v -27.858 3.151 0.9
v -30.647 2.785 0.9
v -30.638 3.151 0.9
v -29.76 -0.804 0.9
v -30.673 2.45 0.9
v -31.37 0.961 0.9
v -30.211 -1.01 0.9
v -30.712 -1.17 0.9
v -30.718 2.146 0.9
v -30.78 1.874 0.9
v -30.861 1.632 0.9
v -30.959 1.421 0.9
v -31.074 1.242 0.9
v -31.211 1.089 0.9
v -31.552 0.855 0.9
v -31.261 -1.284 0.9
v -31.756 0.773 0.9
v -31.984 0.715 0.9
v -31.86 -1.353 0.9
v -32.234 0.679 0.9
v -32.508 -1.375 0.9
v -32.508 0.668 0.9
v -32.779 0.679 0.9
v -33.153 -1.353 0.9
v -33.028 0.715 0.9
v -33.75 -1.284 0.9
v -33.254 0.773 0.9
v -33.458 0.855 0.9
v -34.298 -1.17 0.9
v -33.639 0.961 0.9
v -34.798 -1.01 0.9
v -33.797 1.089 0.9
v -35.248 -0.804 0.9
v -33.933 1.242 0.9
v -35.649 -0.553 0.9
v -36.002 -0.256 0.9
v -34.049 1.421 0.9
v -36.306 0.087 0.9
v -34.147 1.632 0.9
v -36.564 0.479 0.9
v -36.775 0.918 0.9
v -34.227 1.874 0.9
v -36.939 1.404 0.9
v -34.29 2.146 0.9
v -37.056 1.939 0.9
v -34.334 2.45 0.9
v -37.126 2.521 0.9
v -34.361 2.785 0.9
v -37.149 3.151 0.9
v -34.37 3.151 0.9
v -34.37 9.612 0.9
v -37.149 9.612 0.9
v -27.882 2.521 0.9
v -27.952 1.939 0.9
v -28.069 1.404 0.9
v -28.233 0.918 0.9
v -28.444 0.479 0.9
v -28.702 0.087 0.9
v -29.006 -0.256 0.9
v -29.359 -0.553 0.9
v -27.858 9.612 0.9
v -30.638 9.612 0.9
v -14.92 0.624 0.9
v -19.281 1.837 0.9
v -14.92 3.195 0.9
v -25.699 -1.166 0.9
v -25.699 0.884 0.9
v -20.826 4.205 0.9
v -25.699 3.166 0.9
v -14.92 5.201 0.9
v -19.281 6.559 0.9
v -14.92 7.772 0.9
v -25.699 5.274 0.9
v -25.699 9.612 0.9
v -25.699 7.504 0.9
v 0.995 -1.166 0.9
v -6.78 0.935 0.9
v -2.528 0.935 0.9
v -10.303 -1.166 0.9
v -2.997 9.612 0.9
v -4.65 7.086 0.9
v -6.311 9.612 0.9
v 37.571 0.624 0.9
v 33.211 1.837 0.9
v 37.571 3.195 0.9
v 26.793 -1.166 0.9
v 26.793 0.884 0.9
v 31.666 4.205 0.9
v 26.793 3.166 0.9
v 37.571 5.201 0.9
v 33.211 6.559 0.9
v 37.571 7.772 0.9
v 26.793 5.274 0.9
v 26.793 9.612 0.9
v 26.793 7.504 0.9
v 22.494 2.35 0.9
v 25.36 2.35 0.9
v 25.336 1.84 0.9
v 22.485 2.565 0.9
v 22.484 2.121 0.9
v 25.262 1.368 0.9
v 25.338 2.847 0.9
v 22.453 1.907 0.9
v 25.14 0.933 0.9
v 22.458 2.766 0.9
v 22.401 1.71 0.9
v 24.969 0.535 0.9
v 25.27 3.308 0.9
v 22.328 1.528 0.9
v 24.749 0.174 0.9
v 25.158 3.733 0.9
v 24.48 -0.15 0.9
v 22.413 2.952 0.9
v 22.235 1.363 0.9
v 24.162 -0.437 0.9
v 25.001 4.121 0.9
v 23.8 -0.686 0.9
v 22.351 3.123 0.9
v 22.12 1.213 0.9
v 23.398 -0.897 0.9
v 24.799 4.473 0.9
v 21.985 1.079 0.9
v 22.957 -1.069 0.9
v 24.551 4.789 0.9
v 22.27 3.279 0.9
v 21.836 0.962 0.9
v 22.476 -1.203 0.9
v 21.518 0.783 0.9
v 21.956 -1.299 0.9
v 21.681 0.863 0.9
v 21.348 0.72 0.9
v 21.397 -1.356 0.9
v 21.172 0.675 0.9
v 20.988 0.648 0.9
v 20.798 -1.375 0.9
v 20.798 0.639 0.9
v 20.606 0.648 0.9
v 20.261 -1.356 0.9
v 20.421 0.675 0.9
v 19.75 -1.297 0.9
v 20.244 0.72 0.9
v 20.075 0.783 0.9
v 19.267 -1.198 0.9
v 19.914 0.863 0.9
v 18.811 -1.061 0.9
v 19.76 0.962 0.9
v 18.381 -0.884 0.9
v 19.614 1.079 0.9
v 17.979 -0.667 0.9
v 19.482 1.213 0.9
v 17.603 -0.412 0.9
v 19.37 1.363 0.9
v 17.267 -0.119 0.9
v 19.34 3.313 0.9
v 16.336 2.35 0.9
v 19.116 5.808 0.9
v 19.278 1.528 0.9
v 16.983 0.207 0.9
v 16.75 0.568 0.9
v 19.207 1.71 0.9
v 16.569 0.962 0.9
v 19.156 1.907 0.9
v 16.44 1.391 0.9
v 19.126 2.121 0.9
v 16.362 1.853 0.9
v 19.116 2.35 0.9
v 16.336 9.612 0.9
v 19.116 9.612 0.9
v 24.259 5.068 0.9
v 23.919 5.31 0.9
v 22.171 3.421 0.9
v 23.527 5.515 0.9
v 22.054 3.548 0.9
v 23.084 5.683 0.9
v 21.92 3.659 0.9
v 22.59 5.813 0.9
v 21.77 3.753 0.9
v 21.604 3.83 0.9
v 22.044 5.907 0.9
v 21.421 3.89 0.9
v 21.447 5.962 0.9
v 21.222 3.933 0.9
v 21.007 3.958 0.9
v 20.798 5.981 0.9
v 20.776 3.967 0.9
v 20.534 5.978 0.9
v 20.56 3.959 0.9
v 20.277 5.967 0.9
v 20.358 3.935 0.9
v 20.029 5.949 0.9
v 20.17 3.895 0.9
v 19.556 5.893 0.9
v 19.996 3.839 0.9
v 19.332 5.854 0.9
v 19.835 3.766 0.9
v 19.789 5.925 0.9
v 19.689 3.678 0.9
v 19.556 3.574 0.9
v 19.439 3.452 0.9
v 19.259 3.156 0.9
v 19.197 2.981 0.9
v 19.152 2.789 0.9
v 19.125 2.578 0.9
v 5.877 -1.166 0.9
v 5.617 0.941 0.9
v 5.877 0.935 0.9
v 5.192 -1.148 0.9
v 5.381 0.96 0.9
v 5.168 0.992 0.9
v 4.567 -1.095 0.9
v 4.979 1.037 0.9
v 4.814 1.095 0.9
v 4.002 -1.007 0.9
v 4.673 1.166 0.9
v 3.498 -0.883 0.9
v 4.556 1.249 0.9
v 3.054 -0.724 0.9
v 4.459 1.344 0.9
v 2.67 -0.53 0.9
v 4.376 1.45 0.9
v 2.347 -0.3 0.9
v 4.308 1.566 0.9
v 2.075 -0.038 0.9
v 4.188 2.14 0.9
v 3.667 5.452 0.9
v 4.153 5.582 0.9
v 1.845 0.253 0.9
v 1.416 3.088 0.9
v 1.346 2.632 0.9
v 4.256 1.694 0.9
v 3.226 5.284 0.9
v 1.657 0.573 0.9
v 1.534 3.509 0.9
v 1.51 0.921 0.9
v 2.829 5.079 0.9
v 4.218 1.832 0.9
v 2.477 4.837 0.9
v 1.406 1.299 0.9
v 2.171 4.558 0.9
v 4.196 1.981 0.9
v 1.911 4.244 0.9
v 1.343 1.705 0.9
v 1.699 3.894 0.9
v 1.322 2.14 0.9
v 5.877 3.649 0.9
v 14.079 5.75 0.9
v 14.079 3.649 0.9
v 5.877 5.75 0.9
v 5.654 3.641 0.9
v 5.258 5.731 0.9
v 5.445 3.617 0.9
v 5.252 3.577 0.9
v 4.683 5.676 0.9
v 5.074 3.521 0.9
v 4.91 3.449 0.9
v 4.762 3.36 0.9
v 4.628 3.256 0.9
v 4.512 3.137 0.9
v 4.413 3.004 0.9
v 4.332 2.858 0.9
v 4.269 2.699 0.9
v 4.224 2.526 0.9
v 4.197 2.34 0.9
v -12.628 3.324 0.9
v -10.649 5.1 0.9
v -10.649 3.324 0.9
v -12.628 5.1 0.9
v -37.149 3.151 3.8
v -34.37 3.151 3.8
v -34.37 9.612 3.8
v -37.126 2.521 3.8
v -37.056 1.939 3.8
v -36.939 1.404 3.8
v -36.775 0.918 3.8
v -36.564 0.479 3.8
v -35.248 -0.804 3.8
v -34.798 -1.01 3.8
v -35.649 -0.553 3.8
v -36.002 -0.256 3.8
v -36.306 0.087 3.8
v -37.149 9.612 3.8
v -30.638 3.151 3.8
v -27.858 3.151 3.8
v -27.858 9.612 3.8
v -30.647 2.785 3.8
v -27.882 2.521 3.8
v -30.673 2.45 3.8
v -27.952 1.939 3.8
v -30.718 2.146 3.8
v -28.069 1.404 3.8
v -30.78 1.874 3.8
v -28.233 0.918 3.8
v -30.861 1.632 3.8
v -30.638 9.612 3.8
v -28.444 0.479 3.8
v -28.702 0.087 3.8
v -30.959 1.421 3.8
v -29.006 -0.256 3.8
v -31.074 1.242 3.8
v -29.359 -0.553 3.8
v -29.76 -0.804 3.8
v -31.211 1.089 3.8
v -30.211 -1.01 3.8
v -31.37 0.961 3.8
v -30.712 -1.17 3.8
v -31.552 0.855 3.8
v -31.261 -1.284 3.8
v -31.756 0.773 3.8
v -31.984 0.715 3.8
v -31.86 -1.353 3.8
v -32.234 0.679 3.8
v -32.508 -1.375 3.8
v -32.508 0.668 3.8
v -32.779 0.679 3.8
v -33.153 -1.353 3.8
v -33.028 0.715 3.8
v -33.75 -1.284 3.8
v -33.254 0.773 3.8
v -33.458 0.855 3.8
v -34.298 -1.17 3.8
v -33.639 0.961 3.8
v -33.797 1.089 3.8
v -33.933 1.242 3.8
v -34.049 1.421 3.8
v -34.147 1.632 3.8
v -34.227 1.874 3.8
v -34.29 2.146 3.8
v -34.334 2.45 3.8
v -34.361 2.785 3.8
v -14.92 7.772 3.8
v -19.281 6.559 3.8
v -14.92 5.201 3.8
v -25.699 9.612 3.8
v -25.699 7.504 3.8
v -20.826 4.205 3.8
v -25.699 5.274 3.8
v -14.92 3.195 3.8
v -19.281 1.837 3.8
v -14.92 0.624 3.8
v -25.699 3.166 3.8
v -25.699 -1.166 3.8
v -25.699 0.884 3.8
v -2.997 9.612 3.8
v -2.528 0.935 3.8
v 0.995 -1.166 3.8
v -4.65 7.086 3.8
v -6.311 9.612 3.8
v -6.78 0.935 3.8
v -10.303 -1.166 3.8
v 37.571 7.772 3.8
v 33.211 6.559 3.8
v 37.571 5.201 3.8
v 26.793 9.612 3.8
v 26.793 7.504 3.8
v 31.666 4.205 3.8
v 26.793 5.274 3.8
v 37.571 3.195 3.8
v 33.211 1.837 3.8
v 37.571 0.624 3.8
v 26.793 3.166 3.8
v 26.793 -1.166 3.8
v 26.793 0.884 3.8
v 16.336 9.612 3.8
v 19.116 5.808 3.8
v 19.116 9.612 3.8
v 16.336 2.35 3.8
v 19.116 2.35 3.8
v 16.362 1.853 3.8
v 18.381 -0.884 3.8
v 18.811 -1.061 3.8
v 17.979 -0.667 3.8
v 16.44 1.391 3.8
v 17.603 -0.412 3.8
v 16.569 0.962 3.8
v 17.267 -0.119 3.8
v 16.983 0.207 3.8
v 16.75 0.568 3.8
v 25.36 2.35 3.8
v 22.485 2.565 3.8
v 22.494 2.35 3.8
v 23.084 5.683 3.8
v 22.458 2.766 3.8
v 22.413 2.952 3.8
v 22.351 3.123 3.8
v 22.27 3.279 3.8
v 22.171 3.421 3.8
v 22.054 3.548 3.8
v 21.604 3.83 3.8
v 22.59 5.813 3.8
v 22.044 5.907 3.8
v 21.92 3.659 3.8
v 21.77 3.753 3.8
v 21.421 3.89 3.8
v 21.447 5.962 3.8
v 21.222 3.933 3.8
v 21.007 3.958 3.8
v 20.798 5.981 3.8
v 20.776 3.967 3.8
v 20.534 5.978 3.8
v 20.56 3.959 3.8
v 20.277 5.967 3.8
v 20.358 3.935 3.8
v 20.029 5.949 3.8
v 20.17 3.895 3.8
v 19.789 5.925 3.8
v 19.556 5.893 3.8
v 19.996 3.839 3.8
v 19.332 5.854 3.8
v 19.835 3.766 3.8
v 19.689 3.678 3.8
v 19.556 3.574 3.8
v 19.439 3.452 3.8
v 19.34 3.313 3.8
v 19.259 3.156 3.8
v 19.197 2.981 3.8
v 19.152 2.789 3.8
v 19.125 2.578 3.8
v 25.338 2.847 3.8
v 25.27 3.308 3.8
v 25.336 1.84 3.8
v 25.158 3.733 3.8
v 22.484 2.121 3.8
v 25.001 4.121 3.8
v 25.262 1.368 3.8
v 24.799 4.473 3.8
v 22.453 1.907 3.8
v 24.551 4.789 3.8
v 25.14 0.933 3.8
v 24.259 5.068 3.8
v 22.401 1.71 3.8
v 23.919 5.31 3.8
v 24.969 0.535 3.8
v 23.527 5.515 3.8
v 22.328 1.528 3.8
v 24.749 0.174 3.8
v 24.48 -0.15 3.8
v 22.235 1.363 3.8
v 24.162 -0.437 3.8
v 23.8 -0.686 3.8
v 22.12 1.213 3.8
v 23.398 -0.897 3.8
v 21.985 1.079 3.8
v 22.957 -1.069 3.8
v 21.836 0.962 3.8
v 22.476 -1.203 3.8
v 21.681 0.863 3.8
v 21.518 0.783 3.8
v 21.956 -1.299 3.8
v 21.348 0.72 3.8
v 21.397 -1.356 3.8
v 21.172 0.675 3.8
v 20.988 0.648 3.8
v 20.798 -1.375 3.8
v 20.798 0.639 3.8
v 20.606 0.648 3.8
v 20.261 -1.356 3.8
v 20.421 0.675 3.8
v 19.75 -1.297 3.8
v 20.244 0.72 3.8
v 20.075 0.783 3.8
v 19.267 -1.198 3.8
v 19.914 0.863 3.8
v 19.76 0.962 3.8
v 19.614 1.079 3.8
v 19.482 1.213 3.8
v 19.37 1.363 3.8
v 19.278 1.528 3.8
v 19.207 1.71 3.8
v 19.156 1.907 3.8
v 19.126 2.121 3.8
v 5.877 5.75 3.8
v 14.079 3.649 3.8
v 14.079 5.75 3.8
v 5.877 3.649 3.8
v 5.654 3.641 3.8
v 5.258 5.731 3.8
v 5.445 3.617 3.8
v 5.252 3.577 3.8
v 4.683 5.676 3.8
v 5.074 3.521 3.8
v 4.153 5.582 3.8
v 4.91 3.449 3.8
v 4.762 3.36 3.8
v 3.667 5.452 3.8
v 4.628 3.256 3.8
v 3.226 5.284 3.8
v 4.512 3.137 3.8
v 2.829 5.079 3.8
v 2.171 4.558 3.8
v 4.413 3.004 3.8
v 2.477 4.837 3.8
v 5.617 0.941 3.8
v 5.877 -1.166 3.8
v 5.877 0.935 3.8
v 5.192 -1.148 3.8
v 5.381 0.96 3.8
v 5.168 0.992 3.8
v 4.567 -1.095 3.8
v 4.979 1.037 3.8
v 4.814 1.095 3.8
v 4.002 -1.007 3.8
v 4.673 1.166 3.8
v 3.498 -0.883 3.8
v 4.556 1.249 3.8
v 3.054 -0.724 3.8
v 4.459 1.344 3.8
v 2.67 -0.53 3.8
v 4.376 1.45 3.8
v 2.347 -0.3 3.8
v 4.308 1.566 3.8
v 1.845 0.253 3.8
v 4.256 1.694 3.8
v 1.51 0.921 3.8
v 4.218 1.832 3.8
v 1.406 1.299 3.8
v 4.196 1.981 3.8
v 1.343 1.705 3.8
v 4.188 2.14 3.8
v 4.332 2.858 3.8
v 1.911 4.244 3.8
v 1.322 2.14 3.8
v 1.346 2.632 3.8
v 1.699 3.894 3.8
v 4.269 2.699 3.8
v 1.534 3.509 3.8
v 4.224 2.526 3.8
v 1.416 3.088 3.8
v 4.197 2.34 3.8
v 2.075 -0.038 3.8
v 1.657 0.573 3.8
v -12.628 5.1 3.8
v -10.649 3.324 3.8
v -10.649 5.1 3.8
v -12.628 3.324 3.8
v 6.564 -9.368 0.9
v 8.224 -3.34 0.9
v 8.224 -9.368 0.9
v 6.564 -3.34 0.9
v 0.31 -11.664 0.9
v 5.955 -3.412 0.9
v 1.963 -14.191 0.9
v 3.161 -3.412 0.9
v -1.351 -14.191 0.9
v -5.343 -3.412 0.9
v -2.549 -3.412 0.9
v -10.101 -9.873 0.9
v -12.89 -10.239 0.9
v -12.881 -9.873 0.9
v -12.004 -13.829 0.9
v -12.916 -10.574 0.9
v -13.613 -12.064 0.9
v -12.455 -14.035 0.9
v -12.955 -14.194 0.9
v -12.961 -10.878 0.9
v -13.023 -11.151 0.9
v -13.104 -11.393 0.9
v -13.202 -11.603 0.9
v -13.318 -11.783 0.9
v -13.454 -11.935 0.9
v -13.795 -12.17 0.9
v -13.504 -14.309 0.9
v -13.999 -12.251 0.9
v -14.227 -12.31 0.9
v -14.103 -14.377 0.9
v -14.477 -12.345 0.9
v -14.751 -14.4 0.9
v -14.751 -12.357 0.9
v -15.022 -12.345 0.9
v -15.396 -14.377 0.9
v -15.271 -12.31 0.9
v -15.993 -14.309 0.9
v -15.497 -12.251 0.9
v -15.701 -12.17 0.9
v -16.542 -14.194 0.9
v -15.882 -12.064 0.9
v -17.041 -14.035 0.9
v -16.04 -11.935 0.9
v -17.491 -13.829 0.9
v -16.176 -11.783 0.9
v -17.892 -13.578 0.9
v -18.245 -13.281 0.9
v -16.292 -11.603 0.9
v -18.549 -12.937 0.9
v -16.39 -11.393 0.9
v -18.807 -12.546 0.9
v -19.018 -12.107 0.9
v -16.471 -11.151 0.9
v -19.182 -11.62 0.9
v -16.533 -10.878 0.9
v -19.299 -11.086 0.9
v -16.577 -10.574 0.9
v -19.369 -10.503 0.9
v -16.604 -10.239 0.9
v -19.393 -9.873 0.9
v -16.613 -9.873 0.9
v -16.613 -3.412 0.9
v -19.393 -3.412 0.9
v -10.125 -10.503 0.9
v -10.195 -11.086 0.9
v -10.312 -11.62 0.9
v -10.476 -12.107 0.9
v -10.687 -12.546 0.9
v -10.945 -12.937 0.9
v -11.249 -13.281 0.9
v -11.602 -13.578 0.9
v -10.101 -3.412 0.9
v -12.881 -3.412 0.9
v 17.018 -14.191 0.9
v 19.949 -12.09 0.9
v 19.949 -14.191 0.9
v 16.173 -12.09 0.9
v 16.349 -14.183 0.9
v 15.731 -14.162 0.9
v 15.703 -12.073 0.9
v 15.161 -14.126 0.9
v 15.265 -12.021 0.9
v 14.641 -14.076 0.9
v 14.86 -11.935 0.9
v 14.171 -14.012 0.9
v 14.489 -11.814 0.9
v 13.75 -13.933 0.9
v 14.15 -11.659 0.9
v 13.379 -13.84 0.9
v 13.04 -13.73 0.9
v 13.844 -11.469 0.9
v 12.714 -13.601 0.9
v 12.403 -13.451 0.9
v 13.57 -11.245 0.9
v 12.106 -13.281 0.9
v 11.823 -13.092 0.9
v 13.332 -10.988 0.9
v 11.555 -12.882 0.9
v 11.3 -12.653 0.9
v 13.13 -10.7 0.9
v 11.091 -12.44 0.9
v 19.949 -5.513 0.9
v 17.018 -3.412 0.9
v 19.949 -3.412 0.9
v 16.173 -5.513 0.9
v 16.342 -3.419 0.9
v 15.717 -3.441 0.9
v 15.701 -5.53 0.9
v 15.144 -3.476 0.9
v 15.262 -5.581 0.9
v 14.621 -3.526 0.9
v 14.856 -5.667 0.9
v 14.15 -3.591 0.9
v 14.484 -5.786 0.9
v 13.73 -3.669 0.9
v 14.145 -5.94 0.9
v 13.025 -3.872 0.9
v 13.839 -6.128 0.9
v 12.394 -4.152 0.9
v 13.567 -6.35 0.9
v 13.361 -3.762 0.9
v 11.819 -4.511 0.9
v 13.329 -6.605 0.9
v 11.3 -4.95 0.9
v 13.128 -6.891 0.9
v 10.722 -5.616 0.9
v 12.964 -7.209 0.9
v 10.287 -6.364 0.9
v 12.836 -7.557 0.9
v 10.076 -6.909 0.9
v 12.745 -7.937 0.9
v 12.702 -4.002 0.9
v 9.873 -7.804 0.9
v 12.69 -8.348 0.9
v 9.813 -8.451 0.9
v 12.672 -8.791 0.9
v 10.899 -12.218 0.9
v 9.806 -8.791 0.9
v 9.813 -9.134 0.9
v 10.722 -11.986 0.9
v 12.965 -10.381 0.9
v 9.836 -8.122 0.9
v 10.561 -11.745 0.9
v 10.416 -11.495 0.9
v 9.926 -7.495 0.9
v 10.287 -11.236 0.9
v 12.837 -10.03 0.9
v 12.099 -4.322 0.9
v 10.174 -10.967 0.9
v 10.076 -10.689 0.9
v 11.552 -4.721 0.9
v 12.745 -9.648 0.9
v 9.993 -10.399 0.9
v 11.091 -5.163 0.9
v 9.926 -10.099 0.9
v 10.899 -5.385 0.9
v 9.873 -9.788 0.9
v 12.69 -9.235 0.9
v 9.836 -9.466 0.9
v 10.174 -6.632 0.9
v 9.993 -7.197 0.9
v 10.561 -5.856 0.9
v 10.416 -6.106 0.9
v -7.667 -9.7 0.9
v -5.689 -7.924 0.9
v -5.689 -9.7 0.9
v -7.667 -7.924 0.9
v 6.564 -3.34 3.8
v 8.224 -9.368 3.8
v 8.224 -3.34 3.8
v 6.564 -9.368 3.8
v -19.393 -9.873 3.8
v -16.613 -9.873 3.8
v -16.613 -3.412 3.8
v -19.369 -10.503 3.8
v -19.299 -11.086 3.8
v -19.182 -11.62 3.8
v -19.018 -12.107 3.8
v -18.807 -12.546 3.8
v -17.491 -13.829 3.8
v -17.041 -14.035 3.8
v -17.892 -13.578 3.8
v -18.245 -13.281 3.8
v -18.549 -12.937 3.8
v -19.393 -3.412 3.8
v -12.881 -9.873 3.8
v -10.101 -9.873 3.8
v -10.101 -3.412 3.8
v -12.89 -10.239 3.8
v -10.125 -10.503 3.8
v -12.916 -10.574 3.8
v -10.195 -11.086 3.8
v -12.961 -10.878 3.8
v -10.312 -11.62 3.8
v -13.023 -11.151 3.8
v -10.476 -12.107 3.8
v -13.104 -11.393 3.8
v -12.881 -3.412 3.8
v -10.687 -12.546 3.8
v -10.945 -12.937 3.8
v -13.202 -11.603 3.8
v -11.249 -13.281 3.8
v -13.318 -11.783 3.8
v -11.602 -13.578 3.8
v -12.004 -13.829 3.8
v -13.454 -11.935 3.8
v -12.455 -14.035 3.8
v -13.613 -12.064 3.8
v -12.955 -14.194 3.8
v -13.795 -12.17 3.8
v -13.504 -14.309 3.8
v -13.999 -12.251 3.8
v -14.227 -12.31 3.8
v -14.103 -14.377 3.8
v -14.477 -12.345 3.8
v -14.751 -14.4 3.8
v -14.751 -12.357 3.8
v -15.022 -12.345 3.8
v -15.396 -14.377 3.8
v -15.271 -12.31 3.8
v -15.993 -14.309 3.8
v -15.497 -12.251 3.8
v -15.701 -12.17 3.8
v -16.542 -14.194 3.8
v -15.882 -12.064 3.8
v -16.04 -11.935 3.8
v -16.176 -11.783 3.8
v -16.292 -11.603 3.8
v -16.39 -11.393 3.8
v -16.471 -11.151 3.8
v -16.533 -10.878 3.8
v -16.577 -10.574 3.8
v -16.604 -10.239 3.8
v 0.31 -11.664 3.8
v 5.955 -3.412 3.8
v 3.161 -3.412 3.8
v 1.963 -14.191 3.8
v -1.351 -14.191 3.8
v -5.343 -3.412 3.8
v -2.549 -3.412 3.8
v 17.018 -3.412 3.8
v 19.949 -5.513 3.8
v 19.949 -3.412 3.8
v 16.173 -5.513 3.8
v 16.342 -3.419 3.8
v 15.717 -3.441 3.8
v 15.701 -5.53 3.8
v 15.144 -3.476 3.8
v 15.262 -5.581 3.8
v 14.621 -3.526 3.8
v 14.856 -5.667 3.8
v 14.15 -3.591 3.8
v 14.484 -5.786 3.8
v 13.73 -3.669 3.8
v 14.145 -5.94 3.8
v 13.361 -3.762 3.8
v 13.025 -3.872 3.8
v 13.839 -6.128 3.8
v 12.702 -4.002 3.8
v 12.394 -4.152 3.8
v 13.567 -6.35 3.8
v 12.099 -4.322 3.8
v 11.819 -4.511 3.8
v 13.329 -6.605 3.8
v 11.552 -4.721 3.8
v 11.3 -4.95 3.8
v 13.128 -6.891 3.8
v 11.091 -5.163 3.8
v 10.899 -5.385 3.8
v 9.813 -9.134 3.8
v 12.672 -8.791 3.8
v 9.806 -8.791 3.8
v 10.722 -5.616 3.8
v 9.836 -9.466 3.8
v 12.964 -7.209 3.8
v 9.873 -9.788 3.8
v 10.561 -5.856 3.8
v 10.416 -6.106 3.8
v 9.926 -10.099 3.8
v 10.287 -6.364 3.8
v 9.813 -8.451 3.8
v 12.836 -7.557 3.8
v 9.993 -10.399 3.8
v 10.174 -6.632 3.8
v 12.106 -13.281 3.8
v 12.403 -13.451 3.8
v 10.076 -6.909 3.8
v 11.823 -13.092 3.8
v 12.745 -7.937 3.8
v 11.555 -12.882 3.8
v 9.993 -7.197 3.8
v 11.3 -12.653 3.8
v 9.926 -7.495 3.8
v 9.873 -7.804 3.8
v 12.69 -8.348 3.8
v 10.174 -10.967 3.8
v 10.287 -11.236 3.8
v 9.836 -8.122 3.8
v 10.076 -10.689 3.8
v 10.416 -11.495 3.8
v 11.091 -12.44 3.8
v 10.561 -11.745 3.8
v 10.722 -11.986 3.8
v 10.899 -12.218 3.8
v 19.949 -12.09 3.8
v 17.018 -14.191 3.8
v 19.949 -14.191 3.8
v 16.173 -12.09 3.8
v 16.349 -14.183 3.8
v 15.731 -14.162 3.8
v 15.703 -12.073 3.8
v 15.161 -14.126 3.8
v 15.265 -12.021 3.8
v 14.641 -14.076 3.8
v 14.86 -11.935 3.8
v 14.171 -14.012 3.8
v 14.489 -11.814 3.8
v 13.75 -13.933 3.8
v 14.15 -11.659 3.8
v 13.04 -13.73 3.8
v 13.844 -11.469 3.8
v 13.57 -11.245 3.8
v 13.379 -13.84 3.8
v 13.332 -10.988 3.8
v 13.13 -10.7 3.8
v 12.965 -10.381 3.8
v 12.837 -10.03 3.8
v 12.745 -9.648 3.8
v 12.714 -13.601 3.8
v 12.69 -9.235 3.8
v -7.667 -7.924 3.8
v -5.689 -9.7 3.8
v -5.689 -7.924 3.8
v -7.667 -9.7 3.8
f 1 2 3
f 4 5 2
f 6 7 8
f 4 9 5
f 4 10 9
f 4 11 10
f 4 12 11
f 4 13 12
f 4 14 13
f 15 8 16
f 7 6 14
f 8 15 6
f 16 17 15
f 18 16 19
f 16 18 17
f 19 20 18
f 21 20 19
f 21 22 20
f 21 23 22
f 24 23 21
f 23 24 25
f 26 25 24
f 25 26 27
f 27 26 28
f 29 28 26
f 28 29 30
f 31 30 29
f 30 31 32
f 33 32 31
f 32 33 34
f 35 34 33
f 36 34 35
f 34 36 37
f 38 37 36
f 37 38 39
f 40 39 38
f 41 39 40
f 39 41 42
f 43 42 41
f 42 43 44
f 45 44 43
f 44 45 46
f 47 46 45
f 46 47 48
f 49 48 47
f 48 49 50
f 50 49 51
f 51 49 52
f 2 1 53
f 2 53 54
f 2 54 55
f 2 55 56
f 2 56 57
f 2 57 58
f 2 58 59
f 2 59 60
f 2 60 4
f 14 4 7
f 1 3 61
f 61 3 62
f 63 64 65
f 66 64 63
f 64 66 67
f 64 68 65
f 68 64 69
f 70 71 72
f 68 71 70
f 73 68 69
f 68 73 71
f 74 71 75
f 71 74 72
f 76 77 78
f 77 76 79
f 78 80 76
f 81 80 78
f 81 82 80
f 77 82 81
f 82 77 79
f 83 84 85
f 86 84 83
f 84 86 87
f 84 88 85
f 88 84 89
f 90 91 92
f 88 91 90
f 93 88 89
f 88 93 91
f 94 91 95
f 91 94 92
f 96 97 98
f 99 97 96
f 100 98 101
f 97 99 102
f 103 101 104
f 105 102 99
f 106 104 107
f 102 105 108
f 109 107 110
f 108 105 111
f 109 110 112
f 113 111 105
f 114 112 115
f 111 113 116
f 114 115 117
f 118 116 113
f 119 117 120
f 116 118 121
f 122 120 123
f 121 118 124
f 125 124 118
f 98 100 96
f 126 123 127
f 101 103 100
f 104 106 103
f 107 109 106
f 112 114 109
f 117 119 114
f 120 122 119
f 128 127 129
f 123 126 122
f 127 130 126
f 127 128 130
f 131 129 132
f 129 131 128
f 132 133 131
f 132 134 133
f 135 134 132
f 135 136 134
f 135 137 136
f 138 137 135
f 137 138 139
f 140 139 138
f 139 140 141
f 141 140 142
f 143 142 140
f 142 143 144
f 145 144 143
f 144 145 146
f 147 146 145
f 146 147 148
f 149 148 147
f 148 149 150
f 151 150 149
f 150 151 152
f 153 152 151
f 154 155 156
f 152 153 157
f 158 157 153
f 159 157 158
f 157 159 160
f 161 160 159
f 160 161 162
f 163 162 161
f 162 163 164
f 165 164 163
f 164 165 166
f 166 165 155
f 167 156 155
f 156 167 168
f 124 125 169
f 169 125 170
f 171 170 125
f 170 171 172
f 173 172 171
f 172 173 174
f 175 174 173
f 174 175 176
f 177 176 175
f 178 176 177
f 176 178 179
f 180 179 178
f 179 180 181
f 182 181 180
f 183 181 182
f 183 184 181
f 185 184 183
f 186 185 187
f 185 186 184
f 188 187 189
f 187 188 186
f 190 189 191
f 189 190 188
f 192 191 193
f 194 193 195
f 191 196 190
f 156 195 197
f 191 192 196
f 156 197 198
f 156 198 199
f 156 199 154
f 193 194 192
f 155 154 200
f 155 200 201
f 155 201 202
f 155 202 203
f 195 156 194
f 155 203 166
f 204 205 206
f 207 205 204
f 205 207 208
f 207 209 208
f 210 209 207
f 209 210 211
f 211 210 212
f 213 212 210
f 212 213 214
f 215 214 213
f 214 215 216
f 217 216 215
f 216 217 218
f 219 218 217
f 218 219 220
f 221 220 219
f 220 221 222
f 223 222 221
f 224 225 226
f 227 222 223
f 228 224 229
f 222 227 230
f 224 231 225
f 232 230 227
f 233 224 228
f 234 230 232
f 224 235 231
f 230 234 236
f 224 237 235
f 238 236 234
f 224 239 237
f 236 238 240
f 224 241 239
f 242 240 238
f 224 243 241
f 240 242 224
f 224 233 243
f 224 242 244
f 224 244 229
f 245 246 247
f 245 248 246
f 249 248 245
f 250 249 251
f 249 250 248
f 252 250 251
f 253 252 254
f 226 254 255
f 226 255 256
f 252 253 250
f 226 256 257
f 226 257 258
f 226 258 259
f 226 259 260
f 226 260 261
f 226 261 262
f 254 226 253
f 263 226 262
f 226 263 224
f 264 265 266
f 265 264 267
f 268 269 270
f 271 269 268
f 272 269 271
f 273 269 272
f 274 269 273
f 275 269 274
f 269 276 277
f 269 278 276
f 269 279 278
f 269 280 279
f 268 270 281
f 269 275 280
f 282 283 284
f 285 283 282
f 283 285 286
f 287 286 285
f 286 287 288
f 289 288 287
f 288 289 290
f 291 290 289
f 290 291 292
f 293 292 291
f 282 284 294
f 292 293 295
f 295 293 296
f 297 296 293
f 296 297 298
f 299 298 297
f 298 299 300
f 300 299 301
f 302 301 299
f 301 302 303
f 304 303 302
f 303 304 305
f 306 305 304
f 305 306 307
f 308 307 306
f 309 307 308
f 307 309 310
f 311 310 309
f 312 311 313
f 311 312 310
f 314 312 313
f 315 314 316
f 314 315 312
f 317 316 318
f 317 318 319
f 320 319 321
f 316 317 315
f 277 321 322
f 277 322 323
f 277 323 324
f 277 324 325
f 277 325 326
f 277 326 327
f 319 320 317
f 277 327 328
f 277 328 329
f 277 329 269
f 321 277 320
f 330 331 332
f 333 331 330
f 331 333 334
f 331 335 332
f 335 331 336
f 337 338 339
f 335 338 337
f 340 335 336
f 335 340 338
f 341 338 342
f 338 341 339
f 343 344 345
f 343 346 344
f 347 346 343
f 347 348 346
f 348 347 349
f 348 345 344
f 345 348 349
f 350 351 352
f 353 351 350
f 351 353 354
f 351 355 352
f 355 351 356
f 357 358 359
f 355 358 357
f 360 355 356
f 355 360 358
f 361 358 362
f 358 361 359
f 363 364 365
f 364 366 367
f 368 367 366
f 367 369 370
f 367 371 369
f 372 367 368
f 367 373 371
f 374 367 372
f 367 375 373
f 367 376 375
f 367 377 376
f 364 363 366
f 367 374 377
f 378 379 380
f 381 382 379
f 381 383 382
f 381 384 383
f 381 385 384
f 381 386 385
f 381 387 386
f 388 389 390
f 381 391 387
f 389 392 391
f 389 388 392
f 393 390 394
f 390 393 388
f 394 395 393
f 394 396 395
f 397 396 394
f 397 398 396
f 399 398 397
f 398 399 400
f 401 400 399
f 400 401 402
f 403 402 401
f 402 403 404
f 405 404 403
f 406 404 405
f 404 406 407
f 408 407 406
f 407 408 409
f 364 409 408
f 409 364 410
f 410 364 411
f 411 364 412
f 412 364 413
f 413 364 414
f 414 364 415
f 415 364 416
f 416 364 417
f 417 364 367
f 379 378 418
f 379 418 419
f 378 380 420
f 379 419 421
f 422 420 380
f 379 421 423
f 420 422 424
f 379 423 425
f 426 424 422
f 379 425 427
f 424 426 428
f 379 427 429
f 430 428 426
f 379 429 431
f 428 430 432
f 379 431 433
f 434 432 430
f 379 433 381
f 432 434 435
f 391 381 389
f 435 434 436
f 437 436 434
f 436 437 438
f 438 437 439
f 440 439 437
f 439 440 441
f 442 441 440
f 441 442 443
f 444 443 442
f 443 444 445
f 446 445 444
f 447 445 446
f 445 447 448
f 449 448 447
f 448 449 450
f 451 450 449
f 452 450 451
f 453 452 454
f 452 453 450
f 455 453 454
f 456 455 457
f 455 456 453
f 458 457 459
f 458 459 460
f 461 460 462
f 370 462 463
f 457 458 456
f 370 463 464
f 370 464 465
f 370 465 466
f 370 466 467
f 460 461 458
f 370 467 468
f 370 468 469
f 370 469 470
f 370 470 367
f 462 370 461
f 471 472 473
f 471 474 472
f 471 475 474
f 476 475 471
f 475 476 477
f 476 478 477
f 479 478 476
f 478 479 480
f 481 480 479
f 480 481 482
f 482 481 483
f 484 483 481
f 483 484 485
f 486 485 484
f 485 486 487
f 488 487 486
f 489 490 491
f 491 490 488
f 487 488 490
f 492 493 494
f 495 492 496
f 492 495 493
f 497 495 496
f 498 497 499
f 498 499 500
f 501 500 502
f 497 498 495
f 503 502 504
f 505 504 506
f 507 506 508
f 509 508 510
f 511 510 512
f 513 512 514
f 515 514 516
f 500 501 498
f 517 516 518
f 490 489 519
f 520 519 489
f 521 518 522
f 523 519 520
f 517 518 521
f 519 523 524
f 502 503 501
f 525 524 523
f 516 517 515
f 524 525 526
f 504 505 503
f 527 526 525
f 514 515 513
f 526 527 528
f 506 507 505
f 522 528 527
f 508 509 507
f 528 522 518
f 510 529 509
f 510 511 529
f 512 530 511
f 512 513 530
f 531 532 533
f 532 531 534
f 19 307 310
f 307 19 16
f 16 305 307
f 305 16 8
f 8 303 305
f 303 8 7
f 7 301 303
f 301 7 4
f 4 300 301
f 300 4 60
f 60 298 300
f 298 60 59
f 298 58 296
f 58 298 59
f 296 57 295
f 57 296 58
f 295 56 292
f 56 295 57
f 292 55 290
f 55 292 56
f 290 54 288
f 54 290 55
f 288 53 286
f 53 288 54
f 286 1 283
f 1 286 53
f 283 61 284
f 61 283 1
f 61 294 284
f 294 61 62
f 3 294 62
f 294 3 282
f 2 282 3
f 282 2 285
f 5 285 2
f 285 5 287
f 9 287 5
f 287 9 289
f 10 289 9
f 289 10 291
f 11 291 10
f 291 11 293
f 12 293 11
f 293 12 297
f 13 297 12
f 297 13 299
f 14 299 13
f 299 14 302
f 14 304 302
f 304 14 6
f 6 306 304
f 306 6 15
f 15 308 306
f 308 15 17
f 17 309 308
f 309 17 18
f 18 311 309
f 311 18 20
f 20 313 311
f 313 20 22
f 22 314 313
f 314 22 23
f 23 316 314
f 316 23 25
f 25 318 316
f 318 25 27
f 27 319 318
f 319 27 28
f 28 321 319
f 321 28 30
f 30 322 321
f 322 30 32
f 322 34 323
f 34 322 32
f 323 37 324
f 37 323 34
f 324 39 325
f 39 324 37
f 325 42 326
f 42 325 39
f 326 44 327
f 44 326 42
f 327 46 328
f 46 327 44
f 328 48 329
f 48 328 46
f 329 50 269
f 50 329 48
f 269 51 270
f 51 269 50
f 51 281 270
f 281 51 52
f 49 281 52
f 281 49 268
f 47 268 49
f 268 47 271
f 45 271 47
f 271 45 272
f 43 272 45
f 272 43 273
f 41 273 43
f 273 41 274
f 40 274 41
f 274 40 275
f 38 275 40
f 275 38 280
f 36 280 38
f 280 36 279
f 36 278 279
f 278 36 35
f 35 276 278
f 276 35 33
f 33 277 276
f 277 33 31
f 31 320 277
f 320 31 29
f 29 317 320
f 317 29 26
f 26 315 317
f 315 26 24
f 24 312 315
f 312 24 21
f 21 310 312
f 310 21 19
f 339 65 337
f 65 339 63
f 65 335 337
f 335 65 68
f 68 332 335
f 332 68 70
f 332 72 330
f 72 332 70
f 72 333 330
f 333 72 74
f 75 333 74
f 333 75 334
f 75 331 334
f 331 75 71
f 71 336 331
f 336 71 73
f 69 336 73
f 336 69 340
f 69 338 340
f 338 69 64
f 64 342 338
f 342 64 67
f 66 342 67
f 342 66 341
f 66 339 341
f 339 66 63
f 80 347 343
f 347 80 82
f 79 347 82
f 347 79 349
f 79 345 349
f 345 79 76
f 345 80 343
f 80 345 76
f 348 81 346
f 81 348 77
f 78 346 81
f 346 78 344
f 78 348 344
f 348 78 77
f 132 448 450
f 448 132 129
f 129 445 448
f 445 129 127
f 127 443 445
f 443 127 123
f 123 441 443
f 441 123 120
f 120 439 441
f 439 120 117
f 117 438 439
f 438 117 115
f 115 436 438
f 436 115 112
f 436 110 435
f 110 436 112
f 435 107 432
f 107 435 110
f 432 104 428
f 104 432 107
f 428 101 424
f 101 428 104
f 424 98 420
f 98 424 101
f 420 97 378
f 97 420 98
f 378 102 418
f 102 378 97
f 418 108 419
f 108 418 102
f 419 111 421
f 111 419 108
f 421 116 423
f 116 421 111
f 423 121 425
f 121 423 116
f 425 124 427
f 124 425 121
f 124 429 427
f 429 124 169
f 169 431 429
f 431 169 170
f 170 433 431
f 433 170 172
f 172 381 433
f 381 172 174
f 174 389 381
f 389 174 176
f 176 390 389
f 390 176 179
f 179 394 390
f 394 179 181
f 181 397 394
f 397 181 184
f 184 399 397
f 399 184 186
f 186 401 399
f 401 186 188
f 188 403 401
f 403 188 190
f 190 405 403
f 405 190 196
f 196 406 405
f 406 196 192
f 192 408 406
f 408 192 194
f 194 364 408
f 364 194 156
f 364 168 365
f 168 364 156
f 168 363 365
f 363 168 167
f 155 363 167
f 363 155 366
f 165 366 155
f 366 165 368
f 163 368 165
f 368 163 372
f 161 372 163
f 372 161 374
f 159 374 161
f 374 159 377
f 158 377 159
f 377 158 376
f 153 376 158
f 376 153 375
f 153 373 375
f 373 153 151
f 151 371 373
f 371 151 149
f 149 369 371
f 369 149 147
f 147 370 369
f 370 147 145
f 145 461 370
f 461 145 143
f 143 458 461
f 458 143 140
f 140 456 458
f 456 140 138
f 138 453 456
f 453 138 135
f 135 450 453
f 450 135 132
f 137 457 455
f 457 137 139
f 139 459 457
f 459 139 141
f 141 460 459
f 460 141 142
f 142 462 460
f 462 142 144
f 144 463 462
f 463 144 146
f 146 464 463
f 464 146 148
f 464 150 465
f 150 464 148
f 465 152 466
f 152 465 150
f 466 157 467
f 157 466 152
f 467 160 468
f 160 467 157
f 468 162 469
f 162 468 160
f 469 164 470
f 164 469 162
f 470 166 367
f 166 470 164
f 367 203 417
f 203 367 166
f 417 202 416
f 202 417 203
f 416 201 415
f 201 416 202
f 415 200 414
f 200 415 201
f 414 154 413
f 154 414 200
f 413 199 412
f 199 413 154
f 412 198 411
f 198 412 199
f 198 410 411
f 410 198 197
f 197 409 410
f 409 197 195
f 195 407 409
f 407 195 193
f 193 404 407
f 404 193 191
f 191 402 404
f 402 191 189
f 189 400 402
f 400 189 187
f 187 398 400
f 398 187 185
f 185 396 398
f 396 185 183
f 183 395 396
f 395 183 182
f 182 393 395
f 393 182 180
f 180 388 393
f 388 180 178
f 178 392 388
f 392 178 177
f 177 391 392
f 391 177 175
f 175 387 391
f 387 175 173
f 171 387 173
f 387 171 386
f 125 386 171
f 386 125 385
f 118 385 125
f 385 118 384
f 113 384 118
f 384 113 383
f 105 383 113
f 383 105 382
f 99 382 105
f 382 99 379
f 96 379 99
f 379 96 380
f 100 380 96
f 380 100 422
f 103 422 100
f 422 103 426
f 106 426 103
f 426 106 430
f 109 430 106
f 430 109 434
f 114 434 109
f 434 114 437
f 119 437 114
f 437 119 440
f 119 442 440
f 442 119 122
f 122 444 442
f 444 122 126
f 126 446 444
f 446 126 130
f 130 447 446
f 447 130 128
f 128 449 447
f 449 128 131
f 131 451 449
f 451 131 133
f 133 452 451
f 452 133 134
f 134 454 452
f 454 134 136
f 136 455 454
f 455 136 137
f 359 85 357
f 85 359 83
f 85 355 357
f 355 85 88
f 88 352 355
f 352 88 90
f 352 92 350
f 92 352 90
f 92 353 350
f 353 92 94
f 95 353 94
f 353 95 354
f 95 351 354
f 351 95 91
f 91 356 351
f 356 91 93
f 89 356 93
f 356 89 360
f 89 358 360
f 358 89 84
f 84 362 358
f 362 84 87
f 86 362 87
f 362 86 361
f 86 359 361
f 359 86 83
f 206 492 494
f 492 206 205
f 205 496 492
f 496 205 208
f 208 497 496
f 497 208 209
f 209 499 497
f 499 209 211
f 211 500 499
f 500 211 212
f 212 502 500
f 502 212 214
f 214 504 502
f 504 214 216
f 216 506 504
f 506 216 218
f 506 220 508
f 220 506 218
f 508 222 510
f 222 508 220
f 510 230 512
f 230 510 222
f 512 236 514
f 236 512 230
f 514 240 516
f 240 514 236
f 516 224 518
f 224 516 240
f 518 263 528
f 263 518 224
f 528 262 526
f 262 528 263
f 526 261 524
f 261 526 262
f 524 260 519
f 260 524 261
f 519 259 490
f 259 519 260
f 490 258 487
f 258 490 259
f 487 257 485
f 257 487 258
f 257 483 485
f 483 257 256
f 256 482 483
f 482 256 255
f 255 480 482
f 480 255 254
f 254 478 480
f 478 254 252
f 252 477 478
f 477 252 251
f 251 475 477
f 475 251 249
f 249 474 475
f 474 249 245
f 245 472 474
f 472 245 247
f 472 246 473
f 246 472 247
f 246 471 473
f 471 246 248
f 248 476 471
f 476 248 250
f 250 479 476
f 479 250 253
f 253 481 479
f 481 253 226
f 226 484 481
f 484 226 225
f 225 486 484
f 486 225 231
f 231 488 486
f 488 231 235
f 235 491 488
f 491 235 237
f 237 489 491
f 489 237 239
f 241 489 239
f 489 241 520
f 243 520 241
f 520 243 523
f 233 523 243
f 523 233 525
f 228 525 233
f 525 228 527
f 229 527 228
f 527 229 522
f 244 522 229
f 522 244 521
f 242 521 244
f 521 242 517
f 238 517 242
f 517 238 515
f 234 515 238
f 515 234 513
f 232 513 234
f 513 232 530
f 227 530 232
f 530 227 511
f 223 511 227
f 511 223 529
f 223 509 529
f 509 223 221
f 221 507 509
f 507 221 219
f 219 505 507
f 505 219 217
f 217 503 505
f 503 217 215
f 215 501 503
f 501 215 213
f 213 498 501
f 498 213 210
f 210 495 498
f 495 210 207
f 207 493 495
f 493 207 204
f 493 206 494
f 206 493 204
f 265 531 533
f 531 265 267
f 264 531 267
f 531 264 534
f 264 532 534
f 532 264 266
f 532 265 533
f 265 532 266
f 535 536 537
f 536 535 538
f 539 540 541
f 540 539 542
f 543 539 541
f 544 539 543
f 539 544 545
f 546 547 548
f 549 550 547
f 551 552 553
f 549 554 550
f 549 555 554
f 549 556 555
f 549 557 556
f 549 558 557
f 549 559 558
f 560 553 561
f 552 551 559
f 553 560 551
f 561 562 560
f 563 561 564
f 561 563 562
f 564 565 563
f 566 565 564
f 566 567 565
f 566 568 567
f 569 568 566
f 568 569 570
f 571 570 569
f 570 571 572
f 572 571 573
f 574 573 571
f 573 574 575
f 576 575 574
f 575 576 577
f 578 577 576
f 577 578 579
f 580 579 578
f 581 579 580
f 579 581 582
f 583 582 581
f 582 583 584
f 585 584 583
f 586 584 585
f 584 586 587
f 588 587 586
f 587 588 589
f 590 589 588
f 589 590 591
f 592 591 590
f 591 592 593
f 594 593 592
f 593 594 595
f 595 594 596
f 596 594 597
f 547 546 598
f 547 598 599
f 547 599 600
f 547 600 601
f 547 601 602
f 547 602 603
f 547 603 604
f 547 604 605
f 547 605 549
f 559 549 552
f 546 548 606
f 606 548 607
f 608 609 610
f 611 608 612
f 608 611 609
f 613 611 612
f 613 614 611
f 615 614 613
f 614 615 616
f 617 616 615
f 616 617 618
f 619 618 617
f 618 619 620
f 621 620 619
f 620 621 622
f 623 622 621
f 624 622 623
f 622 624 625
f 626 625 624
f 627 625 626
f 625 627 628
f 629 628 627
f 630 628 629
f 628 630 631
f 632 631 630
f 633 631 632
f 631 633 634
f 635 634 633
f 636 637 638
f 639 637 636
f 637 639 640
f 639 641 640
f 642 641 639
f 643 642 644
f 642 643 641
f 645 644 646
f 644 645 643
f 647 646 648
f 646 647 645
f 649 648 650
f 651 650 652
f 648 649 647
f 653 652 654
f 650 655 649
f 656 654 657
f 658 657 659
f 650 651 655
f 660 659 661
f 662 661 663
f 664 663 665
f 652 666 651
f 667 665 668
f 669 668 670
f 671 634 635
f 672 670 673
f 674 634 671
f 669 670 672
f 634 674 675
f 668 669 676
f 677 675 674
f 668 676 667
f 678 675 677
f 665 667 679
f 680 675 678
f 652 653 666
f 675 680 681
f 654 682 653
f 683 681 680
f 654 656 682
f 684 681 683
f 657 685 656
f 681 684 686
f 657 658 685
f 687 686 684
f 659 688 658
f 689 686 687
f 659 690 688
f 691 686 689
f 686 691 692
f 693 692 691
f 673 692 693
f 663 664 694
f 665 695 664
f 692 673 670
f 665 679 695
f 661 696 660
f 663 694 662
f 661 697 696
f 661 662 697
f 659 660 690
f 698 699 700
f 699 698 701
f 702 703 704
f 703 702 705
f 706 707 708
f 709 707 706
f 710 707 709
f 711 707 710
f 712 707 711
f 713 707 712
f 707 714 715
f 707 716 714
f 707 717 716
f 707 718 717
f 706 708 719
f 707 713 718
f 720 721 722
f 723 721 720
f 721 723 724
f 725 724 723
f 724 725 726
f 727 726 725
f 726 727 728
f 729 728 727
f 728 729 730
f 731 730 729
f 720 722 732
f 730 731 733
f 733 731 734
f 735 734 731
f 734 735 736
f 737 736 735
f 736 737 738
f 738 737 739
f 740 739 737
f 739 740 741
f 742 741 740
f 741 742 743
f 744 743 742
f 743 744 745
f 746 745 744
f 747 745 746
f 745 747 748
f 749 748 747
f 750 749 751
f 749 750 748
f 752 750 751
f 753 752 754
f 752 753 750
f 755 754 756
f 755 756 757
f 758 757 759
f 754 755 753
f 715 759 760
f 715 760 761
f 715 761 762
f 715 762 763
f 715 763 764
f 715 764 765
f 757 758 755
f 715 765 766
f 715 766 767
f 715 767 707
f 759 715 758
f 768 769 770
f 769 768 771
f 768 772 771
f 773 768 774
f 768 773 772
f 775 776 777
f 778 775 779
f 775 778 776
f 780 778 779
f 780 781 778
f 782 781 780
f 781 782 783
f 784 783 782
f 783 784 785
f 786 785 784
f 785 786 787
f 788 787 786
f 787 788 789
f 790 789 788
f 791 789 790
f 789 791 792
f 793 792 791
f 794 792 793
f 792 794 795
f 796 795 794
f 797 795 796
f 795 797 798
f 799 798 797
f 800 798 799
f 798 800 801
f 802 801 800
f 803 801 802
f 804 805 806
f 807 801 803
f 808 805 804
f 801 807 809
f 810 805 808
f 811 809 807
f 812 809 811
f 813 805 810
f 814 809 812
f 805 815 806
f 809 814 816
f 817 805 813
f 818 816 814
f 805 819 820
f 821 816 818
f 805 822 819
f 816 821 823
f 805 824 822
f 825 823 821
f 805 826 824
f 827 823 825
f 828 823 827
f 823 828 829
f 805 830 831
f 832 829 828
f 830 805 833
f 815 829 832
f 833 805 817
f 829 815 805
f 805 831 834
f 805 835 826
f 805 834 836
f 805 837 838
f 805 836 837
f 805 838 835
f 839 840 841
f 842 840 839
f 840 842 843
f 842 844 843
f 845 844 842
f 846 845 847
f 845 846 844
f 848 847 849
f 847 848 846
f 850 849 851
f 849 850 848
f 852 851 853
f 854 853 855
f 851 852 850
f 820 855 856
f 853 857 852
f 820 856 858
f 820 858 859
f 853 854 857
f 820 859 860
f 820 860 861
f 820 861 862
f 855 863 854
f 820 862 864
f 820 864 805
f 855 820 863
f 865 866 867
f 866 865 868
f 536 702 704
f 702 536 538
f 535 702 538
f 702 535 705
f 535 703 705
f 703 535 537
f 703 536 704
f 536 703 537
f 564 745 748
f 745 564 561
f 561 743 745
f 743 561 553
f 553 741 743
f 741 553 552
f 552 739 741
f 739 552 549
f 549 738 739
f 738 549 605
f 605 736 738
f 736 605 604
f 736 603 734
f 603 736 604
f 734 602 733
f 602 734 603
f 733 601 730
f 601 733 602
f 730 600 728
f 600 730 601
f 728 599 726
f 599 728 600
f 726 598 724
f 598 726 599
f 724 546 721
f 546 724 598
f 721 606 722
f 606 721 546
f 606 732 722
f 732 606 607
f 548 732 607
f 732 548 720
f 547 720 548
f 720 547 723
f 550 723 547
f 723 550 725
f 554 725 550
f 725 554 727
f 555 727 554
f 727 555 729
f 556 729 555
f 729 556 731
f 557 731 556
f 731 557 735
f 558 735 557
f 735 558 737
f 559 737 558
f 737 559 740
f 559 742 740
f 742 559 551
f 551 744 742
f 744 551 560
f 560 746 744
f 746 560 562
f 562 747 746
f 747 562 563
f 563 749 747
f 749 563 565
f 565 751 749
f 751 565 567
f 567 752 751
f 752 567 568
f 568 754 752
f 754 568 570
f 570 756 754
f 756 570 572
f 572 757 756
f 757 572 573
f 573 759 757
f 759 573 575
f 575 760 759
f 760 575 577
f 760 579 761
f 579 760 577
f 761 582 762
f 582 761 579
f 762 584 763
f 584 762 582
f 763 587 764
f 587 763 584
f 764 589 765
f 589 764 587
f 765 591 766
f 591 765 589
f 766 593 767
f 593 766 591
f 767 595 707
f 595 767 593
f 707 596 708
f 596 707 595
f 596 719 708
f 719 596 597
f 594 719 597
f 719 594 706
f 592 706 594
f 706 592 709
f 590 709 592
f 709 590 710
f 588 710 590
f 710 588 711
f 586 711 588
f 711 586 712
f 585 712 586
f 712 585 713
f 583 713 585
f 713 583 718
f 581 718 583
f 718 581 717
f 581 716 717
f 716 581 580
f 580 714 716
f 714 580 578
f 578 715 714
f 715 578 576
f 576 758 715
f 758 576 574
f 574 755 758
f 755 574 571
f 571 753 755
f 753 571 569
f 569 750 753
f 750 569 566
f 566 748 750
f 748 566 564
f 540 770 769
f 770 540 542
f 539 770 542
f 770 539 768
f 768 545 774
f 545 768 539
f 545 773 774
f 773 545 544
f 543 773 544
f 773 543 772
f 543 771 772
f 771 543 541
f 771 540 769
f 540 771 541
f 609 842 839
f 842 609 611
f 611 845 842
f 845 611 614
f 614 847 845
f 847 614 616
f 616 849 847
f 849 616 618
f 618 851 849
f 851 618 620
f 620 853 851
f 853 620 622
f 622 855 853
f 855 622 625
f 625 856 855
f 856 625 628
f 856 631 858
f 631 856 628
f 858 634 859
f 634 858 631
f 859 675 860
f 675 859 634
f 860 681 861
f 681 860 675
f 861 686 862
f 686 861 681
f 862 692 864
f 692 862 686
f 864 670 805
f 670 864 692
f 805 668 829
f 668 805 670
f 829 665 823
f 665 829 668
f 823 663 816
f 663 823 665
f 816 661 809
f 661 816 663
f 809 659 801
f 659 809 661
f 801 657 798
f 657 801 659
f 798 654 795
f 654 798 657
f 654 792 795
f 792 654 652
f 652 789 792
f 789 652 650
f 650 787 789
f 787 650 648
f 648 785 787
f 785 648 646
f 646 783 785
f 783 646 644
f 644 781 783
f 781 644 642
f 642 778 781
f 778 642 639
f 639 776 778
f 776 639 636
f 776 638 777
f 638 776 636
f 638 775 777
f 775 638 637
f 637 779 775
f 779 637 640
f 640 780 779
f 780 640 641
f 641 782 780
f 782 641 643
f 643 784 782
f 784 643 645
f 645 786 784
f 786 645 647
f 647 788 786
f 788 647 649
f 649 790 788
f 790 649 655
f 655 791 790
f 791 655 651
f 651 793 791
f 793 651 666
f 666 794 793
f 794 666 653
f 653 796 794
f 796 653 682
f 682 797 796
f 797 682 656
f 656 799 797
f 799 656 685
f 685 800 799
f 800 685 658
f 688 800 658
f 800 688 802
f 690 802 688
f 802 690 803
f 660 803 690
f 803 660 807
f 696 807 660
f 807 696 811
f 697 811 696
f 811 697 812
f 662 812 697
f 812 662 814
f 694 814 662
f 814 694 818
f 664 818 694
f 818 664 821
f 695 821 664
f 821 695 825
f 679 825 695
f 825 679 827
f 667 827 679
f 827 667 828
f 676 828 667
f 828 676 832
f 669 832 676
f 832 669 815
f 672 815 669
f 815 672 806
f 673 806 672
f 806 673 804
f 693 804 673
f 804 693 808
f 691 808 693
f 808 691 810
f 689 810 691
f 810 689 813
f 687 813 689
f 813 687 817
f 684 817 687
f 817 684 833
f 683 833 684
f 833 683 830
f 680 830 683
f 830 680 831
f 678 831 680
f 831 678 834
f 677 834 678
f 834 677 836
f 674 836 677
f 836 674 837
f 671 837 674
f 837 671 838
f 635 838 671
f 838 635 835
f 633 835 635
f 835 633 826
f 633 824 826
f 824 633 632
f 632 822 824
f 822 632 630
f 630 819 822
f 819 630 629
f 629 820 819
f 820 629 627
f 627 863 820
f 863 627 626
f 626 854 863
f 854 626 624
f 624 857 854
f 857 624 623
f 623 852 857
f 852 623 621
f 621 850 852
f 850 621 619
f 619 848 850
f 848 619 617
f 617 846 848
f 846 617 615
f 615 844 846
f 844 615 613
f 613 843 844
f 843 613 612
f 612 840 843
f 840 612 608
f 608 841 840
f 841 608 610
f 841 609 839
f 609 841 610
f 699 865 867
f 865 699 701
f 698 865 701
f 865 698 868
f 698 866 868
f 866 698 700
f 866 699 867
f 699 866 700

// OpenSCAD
$fn = 48;
  // syllabics (overlaid on icon, tallest)
  translate([0, 3.994, 0.900]) linear_extrude(height=2.900) text("ᑌᕒᐎᓕᑲᕒ", size=10.646, halign="center", valign="center", font="Euphemia UCAS:style=Bold");
  translate([0, -8.994, 0.900]) linear_extrude(height=2.900) text("ᑌᐺᑊᑕ", size=10.646, halign="center", valign="center", font="Euphemia UCAS:style=Bold");
